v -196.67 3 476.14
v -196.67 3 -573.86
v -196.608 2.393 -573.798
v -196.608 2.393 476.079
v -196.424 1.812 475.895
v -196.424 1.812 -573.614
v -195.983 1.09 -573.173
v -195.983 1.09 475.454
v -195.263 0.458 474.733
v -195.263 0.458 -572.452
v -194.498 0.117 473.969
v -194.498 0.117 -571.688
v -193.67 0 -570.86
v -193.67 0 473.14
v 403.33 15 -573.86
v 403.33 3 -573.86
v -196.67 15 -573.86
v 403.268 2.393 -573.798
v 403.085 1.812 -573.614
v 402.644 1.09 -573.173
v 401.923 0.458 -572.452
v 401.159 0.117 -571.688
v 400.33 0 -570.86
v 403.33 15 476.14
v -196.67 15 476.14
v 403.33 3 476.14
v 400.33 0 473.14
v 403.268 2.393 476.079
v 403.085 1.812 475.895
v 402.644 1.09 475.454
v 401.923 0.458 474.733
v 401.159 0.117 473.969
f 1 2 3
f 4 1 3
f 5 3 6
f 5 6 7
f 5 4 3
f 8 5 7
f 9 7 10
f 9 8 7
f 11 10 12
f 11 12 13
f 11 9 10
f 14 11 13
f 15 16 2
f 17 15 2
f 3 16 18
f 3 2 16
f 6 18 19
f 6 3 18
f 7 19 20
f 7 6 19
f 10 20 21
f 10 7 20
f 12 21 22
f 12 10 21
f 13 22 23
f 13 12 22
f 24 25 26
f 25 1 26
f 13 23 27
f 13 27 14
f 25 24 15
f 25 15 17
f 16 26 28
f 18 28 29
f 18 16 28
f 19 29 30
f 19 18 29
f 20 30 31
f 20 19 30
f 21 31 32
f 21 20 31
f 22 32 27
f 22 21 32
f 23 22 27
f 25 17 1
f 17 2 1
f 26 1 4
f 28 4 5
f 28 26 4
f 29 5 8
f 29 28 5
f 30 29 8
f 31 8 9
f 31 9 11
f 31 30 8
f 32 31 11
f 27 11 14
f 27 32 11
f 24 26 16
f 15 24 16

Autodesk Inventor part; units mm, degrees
ref_plane "YZ Plane" through (0, 0, 0) normal (1, 0, 0) x (0, 1, 0)
ref_plane "XZ Plane" through (0, 0, 0) normal (0, 1, 0) x (-1, 0, 0)
ref_plane "XY Plane" through (0, 0, 0) normal (0, 0, 1) x (1, 0, 0)
sketch "Sketch1" plane through (0, 0, 0) normal (0, 1, 0) x (-1, 0, 0)
  line L0 (196.6697, 476.1405) -> (-403.3303, 476.1405)
  line L1 (-403.3303, 476.1405) -> (-403.3303, -573.8595)
  line L2 (-403.3303, -573.8595) -> (196.6697, -573.8595)
  line L3 (196.6697, -573.8595) -> (196.6697, 476.1405)
  point P0 (0, 0)
  dimension "d0" = 1050
  dimension "d1" = 600
extrude "Extrusion1" add sketch "Sketch1" along normal blind 15
fillet "Fillet1" radius 3 4 edges at (403.3303, 0, -48.8595) (103.3303, 0, 476.1405) (-196.6697, 0, -48.8595) (103.3303, 0, -573.8595)
properties part number "adapter" material "Wood Flooring"
